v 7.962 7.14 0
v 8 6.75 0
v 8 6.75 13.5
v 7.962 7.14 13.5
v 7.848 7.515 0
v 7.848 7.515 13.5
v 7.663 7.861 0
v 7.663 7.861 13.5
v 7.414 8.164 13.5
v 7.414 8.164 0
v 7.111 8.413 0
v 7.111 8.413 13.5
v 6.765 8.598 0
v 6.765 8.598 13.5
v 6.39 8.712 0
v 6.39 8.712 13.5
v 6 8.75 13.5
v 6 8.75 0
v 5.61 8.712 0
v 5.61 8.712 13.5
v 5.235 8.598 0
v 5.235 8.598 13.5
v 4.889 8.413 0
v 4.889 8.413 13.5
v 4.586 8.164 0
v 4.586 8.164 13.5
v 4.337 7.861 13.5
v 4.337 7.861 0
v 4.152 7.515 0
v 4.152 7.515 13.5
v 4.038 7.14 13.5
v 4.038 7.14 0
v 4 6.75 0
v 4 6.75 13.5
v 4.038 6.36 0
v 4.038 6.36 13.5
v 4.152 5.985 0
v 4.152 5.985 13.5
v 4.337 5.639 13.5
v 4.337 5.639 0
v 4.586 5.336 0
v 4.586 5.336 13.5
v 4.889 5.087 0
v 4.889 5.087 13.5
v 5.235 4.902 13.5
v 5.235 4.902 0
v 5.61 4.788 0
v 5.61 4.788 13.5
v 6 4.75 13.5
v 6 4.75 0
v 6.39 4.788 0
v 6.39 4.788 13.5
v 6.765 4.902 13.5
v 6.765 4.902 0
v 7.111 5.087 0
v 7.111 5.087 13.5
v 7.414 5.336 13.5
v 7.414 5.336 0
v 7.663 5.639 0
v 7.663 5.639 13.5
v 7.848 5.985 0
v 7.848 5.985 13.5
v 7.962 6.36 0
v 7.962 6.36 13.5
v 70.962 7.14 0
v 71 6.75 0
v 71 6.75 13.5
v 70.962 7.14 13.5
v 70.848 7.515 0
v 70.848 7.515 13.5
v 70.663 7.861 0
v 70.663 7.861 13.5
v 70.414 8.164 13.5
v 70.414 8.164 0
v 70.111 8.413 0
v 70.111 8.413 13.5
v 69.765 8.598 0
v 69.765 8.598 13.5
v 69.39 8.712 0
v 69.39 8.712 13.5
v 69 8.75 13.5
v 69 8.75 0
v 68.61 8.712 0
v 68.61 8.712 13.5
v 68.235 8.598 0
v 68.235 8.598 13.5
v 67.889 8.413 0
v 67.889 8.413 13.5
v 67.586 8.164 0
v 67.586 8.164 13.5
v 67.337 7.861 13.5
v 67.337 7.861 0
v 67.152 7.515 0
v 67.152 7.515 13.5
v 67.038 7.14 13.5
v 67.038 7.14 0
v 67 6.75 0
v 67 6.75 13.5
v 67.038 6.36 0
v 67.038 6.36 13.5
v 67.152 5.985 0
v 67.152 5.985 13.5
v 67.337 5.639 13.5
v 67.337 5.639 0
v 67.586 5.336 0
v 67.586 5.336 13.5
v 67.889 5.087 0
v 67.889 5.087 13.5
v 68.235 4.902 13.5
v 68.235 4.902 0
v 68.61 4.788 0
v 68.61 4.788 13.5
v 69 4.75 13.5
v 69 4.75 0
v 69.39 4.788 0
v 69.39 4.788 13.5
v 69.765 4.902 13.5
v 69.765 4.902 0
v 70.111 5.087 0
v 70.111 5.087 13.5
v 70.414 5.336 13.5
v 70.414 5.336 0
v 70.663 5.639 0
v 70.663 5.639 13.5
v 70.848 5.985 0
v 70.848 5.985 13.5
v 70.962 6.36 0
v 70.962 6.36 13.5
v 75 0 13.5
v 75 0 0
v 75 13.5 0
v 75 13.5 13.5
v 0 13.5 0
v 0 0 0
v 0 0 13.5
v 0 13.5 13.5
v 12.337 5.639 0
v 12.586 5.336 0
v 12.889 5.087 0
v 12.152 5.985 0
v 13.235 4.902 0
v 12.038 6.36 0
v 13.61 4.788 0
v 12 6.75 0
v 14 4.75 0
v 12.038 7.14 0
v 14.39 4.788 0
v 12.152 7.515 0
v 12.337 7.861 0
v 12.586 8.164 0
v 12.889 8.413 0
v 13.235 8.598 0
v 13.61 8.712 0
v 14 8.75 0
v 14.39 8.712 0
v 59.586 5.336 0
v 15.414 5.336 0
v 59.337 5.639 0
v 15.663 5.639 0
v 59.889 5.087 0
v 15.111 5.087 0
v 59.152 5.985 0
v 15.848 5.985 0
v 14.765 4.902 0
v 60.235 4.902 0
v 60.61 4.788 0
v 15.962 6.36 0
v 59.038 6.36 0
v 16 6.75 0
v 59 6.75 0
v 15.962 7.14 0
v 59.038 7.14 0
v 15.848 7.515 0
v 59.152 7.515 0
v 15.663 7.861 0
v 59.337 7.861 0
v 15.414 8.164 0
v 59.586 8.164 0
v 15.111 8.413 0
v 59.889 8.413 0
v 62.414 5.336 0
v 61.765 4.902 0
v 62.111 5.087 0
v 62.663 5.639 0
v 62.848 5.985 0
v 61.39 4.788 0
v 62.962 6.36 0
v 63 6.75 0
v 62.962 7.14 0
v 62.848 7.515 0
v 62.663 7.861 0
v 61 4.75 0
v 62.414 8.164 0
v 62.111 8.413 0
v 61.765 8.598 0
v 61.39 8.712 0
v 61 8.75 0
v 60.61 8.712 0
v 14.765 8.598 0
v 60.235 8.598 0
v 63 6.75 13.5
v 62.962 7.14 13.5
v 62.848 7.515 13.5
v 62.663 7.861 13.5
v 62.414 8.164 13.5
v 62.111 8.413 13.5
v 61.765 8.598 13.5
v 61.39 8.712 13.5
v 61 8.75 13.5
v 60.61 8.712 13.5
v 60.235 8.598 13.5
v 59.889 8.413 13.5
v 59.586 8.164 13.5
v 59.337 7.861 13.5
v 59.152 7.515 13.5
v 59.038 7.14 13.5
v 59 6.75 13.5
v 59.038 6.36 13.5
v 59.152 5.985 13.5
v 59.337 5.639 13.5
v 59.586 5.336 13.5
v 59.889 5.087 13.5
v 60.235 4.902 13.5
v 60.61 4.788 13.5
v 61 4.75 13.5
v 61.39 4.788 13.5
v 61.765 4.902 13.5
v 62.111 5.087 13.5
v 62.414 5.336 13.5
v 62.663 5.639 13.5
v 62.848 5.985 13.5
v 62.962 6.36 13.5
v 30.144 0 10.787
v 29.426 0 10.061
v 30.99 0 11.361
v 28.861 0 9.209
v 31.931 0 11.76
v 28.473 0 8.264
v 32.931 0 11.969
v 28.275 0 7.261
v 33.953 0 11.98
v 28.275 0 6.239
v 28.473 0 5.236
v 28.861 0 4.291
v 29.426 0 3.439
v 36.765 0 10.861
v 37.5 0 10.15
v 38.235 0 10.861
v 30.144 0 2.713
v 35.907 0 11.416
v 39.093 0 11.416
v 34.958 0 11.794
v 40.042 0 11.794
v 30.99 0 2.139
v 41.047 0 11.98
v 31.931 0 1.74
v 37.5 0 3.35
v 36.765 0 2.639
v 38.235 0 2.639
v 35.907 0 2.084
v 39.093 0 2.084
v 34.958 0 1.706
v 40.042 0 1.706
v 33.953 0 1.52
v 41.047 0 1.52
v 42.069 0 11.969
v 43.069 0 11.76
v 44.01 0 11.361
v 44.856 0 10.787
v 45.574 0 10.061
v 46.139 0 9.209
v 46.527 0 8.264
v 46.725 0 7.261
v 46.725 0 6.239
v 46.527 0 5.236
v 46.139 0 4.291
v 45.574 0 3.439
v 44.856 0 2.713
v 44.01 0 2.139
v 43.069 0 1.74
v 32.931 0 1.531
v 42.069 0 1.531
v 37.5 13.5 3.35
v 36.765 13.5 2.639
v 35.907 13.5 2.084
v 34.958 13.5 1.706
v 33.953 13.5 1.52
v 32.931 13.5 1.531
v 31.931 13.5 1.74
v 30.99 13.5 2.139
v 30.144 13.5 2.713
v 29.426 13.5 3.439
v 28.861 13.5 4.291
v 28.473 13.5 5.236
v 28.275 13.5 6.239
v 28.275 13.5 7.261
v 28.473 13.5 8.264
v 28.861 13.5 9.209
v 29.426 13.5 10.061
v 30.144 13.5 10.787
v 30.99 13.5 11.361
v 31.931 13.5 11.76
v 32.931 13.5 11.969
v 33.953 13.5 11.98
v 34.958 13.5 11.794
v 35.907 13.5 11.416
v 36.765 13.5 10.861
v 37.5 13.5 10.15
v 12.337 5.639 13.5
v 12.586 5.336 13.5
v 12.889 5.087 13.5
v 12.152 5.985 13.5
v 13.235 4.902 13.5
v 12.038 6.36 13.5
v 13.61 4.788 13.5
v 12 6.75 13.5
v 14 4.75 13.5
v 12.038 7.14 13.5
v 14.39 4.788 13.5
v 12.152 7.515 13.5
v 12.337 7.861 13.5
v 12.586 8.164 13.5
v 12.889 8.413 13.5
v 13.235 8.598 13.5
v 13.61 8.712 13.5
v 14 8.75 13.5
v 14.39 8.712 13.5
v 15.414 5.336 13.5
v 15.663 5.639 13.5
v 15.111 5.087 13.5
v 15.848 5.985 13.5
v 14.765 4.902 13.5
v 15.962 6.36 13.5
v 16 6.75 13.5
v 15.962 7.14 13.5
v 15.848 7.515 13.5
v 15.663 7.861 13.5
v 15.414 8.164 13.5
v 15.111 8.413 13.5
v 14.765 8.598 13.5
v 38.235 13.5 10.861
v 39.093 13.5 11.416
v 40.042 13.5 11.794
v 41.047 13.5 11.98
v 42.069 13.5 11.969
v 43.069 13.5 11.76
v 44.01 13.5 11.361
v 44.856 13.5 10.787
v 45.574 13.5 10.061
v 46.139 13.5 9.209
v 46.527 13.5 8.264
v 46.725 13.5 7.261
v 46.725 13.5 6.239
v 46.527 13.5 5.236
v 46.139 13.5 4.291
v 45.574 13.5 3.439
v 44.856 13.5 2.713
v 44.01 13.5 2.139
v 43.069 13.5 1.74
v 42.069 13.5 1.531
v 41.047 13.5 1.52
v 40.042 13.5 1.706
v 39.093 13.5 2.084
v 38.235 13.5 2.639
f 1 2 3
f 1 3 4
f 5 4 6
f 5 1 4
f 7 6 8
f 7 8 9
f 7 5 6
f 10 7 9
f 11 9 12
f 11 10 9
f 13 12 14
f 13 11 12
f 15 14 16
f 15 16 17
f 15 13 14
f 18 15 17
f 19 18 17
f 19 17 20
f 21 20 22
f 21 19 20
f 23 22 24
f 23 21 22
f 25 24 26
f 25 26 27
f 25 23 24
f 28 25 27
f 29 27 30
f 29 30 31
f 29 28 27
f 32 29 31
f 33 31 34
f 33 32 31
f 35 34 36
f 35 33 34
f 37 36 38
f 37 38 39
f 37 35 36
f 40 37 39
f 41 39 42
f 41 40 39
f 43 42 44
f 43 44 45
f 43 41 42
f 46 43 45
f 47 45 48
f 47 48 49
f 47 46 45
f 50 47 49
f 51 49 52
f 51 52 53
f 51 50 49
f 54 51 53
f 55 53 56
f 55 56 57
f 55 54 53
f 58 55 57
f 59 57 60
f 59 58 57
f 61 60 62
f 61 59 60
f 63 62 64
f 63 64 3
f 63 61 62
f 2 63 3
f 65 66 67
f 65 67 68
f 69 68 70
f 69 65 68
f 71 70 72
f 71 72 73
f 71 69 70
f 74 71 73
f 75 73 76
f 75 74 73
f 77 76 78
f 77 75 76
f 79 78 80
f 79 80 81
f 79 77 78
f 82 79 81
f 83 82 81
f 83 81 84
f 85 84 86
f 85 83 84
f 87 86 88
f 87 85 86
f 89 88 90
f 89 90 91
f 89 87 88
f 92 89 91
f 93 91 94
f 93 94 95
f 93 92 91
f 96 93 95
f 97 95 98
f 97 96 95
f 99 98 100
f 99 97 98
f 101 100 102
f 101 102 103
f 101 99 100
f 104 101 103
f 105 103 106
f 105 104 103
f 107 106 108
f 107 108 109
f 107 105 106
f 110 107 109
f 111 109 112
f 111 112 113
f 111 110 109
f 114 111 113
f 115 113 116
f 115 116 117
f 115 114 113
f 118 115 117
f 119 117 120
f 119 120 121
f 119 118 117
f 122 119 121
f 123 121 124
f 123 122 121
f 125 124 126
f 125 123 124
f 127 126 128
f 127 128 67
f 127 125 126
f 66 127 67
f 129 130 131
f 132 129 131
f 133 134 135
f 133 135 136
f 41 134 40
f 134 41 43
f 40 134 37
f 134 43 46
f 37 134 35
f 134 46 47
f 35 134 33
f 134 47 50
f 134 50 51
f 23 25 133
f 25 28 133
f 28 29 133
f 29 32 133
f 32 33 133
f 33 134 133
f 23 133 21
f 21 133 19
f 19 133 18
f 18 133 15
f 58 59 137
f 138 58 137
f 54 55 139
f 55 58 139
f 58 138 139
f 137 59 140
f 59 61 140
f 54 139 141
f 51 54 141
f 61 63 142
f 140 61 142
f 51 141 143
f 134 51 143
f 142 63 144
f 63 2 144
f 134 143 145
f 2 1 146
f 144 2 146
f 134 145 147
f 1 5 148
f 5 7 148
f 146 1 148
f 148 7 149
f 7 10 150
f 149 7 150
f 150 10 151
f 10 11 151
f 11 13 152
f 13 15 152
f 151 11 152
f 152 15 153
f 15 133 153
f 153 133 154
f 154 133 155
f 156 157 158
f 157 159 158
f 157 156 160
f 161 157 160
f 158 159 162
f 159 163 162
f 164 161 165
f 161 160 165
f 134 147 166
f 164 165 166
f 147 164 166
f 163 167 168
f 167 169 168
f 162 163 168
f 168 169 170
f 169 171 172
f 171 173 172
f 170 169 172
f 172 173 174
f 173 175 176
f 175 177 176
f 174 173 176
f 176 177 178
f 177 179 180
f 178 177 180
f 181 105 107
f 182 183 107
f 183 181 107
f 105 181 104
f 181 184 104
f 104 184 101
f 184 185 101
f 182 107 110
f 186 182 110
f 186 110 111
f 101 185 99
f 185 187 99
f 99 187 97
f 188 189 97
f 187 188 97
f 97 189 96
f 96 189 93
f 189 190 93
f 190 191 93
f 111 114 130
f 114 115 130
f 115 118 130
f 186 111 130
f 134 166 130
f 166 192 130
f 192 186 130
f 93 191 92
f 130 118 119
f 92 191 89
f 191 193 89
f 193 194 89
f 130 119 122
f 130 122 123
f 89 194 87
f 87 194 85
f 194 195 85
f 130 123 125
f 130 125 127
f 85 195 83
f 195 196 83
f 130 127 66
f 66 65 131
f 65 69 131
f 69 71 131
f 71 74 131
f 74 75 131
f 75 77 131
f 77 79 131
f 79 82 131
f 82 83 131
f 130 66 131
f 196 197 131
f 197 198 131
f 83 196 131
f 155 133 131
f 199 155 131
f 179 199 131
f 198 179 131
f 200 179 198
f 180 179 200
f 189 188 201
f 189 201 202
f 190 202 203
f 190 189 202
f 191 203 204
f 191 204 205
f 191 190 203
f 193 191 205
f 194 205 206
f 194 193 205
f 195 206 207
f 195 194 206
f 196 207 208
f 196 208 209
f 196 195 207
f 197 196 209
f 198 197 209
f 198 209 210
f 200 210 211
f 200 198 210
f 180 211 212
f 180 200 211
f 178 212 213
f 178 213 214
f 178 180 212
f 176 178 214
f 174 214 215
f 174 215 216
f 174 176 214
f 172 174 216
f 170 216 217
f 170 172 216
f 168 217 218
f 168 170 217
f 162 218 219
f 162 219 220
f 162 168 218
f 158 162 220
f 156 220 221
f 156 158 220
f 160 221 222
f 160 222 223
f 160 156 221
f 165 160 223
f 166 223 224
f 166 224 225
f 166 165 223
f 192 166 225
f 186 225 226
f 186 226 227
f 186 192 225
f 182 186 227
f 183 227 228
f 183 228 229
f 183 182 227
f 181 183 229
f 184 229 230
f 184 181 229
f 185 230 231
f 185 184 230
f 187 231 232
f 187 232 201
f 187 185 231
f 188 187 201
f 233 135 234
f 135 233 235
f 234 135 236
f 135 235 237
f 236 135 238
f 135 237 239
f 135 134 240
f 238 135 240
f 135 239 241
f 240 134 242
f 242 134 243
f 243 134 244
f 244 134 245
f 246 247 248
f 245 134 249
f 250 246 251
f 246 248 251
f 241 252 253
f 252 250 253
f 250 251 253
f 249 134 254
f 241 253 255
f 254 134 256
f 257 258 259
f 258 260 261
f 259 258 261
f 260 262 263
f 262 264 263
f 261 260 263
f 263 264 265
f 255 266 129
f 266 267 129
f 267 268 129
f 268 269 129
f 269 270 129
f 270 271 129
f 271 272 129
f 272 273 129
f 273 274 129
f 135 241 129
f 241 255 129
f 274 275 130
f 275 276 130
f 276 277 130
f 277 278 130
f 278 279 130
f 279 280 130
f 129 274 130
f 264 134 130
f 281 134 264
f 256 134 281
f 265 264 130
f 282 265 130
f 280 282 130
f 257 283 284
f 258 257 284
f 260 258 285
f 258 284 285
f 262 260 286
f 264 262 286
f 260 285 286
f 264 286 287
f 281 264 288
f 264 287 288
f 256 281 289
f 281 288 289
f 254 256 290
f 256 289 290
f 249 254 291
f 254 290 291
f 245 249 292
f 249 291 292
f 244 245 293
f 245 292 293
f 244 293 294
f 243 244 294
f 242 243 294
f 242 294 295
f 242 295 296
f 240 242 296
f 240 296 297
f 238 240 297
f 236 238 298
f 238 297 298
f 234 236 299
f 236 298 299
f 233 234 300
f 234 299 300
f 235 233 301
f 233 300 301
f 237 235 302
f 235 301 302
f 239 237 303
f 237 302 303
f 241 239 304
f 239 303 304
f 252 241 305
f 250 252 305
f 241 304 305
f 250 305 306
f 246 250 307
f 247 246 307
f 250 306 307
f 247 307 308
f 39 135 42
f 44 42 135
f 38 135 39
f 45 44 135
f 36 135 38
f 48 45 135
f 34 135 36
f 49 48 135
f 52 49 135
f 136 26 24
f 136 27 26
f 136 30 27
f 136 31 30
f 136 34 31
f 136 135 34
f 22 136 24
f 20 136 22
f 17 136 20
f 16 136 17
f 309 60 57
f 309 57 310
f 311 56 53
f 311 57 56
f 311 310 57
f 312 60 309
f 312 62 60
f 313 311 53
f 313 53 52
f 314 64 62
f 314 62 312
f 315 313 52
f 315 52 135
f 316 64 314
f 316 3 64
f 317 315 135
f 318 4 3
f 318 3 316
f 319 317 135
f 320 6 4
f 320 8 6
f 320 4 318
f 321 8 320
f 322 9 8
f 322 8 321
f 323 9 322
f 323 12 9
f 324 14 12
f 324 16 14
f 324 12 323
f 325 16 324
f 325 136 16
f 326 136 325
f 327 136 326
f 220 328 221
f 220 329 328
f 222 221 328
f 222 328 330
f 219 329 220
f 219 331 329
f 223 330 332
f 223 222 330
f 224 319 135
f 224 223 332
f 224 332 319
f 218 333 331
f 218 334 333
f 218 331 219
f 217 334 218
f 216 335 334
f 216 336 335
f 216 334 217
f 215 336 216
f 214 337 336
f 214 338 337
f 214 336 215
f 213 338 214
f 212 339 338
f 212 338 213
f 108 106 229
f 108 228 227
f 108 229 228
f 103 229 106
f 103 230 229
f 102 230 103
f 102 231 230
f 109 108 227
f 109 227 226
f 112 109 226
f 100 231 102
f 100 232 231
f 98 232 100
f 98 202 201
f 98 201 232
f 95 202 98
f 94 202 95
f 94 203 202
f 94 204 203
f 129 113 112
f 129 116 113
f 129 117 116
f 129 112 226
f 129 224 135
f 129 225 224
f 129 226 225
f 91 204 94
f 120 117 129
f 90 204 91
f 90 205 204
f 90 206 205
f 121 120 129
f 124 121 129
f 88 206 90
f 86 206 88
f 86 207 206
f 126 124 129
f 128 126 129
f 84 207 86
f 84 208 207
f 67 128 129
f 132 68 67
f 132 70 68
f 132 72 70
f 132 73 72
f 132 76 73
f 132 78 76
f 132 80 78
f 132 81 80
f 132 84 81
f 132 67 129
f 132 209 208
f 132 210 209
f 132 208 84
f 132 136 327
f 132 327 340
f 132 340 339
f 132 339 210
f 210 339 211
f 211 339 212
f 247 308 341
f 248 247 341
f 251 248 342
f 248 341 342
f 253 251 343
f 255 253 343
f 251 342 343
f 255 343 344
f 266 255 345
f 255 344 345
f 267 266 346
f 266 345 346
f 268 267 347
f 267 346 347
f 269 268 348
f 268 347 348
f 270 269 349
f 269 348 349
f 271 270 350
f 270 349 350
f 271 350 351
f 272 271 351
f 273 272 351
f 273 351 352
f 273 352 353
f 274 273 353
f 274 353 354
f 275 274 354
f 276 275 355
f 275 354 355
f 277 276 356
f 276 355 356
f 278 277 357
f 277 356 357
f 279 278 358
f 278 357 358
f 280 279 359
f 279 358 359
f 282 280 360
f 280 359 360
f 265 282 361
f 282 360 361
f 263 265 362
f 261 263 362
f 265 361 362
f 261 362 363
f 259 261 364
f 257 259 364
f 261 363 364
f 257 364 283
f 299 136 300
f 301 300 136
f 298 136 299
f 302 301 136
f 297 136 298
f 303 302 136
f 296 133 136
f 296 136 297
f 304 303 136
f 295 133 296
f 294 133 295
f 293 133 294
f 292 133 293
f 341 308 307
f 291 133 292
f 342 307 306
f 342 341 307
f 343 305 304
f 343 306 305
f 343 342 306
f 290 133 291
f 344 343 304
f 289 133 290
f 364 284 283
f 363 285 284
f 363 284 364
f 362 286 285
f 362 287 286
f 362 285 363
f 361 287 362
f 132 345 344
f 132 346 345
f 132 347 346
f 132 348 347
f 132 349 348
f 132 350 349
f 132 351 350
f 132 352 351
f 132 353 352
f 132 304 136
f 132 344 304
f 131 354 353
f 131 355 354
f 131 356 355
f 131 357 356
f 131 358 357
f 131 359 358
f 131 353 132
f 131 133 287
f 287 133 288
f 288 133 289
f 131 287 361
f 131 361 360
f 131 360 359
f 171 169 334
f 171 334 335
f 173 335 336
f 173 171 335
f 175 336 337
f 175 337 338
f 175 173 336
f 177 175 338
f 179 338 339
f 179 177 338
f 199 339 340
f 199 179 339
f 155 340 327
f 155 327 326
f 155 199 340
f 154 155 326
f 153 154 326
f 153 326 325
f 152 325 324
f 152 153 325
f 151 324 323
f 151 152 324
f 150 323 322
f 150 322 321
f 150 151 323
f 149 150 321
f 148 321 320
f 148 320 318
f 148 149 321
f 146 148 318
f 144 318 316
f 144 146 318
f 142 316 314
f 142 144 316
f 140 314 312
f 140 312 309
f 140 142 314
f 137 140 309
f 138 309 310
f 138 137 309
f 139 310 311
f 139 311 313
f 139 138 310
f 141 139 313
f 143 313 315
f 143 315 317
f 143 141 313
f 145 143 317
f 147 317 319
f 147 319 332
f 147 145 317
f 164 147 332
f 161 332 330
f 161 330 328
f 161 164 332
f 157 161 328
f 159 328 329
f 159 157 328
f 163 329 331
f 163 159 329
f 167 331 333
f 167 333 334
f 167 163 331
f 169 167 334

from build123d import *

# Parameters (mm, degrees)
SKETCH2_W           = 75
SKETCH2_H           = 13.5
SKETCH2_R           = 2
BOSS_EXTRUDE1_DEPTH = 13.5
CUT_EXTRUDE1_DEPTH  = 13.5


with BuildPart() as part:
    # Sketch2 → Boss-Extrude1 (new body)
    with BuildSketch(Plane.XY):
        with Locations((37.5, 6.75)):
            Rectangle(SKETCH2_W, SKETCH2_H)
        with Locations((6, 6.75)):
            Circle(SKETCH2_R, mode=Mode.SUBTRACT)
        with Locations((14, 6.75)):
            Circle(SKETCH2_R, mode=Mode.SUBTRACT)
        with Locations((69, 6.75)):
            Circle(SKETCH2_R, mode=Mode.SUBTRACT)
        with Locations((61, 6.75)):
            Circle(SKETCH2_R, mode=Mode.SUBTRACT)
    extrude(amount=BOSS_EXTRUDE1_DEPTH)

    # Sketch3 → Cut-Extrude1 (cut)
    with BuildSketch(Plane(origin=(0, 13.5, 0), x_dir=(1, 0, 0), z_dir=(0, 1, 0))):
        with BuildLine():
            ThreePointArc((37.5, -3.349632373), (28.25, -6.75), (37.5, -10.150367627))
            ThreePointArc((37.5, -10.150367627), (46.75, -6.75), (37.5, -3.349632373))
        make_face()
    extrude(amount=-CUT_EXTRUDE1_DEPTH, mode=Mode.SUBTRACT)


solid = part.part
